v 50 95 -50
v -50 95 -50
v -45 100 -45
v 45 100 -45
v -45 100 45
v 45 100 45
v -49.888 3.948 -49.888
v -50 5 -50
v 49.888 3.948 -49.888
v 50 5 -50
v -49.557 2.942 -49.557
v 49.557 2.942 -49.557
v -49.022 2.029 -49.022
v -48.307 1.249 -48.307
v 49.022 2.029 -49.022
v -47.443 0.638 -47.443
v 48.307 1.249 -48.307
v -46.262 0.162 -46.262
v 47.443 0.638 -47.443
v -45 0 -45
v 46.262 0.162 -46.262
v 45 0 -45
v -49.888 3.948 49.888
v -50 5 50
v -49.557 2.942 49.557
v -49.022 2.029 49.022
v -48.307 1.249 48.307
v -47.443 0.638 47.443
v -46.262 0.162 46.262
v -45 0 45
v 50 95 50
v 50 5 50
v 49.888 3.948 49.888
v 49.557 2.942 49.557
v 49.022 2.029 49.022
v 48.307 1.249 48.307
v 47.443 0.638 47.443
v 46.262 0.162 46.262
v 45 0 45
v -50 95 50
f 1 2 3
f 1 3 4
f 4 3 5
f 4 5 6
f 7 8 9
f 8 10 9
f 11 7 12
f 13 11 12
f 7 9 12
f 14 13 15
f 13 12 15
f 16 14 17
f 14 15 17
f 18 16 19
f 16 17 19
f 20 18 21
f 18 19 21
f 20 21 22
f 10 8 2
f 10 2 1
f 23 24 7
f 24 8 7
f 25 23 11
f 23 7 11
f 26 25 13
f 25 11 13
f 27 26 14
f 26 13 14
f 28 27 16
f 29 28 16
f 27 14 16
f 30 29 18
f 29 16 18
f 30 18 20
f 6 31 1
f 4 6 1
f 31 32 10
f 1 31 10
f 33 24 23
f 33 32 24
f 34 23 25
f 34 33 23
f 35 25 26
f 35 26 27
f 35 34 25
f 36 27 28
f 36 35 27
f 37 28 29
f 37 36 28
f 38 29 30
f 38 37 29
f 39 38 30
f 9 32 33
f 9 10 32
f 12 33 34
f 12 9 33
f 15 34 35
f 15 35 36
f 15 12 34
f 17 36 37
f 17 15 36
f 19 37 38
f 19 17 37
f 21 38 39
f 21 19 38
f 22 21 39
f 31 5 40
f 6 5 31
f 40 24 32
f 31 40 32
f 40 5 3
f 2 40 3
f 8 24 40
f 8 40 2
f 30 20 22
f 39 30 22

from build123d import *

# Parameters (mm, degrees)
SKETCH1_W           = 100
SKETCH1_H           = 100
BOSS_EXTRUDE1_DEPTH = 100
FILLET1_R           = 5
CHAMFER2_SIZE       = 5


with BuildPart() as part:
    # Sketch1 → Boss-Extrude1 (new body)
    with BuildSketch(Plane(origin=(0, 0, 0), x_dir=(1, 0, 0), z_dir=(0, 1, 0))):
        Rectangle(SKETCH1_W, SKETCH1_H)
    extrude(amount=BOSS_EXTRUDE1_DEPTH)

    # Fillet1
    fillet1_edges = [part.edges().sort_by_distance(p)[0] for p in [
        (0, 0, -50),
        (50, 0, 0),
        (0, 0, 50),
        (-50, 0, 0),
    ]]
    fillet(fillet1_edges, radius=FILLET1_R)

    # Chamfer2
    chamfer2_edges = [part.edges().sort_by_distance(p)[0] for p in [
        (50, 100, 0),
        (0, 100, -50),
        (-50, 100, 0),
        (0, 100, 50),
    ]]
    chamfer(chamfer2_edges, length=CHAMFER2_SIZE)


solid = part.part
